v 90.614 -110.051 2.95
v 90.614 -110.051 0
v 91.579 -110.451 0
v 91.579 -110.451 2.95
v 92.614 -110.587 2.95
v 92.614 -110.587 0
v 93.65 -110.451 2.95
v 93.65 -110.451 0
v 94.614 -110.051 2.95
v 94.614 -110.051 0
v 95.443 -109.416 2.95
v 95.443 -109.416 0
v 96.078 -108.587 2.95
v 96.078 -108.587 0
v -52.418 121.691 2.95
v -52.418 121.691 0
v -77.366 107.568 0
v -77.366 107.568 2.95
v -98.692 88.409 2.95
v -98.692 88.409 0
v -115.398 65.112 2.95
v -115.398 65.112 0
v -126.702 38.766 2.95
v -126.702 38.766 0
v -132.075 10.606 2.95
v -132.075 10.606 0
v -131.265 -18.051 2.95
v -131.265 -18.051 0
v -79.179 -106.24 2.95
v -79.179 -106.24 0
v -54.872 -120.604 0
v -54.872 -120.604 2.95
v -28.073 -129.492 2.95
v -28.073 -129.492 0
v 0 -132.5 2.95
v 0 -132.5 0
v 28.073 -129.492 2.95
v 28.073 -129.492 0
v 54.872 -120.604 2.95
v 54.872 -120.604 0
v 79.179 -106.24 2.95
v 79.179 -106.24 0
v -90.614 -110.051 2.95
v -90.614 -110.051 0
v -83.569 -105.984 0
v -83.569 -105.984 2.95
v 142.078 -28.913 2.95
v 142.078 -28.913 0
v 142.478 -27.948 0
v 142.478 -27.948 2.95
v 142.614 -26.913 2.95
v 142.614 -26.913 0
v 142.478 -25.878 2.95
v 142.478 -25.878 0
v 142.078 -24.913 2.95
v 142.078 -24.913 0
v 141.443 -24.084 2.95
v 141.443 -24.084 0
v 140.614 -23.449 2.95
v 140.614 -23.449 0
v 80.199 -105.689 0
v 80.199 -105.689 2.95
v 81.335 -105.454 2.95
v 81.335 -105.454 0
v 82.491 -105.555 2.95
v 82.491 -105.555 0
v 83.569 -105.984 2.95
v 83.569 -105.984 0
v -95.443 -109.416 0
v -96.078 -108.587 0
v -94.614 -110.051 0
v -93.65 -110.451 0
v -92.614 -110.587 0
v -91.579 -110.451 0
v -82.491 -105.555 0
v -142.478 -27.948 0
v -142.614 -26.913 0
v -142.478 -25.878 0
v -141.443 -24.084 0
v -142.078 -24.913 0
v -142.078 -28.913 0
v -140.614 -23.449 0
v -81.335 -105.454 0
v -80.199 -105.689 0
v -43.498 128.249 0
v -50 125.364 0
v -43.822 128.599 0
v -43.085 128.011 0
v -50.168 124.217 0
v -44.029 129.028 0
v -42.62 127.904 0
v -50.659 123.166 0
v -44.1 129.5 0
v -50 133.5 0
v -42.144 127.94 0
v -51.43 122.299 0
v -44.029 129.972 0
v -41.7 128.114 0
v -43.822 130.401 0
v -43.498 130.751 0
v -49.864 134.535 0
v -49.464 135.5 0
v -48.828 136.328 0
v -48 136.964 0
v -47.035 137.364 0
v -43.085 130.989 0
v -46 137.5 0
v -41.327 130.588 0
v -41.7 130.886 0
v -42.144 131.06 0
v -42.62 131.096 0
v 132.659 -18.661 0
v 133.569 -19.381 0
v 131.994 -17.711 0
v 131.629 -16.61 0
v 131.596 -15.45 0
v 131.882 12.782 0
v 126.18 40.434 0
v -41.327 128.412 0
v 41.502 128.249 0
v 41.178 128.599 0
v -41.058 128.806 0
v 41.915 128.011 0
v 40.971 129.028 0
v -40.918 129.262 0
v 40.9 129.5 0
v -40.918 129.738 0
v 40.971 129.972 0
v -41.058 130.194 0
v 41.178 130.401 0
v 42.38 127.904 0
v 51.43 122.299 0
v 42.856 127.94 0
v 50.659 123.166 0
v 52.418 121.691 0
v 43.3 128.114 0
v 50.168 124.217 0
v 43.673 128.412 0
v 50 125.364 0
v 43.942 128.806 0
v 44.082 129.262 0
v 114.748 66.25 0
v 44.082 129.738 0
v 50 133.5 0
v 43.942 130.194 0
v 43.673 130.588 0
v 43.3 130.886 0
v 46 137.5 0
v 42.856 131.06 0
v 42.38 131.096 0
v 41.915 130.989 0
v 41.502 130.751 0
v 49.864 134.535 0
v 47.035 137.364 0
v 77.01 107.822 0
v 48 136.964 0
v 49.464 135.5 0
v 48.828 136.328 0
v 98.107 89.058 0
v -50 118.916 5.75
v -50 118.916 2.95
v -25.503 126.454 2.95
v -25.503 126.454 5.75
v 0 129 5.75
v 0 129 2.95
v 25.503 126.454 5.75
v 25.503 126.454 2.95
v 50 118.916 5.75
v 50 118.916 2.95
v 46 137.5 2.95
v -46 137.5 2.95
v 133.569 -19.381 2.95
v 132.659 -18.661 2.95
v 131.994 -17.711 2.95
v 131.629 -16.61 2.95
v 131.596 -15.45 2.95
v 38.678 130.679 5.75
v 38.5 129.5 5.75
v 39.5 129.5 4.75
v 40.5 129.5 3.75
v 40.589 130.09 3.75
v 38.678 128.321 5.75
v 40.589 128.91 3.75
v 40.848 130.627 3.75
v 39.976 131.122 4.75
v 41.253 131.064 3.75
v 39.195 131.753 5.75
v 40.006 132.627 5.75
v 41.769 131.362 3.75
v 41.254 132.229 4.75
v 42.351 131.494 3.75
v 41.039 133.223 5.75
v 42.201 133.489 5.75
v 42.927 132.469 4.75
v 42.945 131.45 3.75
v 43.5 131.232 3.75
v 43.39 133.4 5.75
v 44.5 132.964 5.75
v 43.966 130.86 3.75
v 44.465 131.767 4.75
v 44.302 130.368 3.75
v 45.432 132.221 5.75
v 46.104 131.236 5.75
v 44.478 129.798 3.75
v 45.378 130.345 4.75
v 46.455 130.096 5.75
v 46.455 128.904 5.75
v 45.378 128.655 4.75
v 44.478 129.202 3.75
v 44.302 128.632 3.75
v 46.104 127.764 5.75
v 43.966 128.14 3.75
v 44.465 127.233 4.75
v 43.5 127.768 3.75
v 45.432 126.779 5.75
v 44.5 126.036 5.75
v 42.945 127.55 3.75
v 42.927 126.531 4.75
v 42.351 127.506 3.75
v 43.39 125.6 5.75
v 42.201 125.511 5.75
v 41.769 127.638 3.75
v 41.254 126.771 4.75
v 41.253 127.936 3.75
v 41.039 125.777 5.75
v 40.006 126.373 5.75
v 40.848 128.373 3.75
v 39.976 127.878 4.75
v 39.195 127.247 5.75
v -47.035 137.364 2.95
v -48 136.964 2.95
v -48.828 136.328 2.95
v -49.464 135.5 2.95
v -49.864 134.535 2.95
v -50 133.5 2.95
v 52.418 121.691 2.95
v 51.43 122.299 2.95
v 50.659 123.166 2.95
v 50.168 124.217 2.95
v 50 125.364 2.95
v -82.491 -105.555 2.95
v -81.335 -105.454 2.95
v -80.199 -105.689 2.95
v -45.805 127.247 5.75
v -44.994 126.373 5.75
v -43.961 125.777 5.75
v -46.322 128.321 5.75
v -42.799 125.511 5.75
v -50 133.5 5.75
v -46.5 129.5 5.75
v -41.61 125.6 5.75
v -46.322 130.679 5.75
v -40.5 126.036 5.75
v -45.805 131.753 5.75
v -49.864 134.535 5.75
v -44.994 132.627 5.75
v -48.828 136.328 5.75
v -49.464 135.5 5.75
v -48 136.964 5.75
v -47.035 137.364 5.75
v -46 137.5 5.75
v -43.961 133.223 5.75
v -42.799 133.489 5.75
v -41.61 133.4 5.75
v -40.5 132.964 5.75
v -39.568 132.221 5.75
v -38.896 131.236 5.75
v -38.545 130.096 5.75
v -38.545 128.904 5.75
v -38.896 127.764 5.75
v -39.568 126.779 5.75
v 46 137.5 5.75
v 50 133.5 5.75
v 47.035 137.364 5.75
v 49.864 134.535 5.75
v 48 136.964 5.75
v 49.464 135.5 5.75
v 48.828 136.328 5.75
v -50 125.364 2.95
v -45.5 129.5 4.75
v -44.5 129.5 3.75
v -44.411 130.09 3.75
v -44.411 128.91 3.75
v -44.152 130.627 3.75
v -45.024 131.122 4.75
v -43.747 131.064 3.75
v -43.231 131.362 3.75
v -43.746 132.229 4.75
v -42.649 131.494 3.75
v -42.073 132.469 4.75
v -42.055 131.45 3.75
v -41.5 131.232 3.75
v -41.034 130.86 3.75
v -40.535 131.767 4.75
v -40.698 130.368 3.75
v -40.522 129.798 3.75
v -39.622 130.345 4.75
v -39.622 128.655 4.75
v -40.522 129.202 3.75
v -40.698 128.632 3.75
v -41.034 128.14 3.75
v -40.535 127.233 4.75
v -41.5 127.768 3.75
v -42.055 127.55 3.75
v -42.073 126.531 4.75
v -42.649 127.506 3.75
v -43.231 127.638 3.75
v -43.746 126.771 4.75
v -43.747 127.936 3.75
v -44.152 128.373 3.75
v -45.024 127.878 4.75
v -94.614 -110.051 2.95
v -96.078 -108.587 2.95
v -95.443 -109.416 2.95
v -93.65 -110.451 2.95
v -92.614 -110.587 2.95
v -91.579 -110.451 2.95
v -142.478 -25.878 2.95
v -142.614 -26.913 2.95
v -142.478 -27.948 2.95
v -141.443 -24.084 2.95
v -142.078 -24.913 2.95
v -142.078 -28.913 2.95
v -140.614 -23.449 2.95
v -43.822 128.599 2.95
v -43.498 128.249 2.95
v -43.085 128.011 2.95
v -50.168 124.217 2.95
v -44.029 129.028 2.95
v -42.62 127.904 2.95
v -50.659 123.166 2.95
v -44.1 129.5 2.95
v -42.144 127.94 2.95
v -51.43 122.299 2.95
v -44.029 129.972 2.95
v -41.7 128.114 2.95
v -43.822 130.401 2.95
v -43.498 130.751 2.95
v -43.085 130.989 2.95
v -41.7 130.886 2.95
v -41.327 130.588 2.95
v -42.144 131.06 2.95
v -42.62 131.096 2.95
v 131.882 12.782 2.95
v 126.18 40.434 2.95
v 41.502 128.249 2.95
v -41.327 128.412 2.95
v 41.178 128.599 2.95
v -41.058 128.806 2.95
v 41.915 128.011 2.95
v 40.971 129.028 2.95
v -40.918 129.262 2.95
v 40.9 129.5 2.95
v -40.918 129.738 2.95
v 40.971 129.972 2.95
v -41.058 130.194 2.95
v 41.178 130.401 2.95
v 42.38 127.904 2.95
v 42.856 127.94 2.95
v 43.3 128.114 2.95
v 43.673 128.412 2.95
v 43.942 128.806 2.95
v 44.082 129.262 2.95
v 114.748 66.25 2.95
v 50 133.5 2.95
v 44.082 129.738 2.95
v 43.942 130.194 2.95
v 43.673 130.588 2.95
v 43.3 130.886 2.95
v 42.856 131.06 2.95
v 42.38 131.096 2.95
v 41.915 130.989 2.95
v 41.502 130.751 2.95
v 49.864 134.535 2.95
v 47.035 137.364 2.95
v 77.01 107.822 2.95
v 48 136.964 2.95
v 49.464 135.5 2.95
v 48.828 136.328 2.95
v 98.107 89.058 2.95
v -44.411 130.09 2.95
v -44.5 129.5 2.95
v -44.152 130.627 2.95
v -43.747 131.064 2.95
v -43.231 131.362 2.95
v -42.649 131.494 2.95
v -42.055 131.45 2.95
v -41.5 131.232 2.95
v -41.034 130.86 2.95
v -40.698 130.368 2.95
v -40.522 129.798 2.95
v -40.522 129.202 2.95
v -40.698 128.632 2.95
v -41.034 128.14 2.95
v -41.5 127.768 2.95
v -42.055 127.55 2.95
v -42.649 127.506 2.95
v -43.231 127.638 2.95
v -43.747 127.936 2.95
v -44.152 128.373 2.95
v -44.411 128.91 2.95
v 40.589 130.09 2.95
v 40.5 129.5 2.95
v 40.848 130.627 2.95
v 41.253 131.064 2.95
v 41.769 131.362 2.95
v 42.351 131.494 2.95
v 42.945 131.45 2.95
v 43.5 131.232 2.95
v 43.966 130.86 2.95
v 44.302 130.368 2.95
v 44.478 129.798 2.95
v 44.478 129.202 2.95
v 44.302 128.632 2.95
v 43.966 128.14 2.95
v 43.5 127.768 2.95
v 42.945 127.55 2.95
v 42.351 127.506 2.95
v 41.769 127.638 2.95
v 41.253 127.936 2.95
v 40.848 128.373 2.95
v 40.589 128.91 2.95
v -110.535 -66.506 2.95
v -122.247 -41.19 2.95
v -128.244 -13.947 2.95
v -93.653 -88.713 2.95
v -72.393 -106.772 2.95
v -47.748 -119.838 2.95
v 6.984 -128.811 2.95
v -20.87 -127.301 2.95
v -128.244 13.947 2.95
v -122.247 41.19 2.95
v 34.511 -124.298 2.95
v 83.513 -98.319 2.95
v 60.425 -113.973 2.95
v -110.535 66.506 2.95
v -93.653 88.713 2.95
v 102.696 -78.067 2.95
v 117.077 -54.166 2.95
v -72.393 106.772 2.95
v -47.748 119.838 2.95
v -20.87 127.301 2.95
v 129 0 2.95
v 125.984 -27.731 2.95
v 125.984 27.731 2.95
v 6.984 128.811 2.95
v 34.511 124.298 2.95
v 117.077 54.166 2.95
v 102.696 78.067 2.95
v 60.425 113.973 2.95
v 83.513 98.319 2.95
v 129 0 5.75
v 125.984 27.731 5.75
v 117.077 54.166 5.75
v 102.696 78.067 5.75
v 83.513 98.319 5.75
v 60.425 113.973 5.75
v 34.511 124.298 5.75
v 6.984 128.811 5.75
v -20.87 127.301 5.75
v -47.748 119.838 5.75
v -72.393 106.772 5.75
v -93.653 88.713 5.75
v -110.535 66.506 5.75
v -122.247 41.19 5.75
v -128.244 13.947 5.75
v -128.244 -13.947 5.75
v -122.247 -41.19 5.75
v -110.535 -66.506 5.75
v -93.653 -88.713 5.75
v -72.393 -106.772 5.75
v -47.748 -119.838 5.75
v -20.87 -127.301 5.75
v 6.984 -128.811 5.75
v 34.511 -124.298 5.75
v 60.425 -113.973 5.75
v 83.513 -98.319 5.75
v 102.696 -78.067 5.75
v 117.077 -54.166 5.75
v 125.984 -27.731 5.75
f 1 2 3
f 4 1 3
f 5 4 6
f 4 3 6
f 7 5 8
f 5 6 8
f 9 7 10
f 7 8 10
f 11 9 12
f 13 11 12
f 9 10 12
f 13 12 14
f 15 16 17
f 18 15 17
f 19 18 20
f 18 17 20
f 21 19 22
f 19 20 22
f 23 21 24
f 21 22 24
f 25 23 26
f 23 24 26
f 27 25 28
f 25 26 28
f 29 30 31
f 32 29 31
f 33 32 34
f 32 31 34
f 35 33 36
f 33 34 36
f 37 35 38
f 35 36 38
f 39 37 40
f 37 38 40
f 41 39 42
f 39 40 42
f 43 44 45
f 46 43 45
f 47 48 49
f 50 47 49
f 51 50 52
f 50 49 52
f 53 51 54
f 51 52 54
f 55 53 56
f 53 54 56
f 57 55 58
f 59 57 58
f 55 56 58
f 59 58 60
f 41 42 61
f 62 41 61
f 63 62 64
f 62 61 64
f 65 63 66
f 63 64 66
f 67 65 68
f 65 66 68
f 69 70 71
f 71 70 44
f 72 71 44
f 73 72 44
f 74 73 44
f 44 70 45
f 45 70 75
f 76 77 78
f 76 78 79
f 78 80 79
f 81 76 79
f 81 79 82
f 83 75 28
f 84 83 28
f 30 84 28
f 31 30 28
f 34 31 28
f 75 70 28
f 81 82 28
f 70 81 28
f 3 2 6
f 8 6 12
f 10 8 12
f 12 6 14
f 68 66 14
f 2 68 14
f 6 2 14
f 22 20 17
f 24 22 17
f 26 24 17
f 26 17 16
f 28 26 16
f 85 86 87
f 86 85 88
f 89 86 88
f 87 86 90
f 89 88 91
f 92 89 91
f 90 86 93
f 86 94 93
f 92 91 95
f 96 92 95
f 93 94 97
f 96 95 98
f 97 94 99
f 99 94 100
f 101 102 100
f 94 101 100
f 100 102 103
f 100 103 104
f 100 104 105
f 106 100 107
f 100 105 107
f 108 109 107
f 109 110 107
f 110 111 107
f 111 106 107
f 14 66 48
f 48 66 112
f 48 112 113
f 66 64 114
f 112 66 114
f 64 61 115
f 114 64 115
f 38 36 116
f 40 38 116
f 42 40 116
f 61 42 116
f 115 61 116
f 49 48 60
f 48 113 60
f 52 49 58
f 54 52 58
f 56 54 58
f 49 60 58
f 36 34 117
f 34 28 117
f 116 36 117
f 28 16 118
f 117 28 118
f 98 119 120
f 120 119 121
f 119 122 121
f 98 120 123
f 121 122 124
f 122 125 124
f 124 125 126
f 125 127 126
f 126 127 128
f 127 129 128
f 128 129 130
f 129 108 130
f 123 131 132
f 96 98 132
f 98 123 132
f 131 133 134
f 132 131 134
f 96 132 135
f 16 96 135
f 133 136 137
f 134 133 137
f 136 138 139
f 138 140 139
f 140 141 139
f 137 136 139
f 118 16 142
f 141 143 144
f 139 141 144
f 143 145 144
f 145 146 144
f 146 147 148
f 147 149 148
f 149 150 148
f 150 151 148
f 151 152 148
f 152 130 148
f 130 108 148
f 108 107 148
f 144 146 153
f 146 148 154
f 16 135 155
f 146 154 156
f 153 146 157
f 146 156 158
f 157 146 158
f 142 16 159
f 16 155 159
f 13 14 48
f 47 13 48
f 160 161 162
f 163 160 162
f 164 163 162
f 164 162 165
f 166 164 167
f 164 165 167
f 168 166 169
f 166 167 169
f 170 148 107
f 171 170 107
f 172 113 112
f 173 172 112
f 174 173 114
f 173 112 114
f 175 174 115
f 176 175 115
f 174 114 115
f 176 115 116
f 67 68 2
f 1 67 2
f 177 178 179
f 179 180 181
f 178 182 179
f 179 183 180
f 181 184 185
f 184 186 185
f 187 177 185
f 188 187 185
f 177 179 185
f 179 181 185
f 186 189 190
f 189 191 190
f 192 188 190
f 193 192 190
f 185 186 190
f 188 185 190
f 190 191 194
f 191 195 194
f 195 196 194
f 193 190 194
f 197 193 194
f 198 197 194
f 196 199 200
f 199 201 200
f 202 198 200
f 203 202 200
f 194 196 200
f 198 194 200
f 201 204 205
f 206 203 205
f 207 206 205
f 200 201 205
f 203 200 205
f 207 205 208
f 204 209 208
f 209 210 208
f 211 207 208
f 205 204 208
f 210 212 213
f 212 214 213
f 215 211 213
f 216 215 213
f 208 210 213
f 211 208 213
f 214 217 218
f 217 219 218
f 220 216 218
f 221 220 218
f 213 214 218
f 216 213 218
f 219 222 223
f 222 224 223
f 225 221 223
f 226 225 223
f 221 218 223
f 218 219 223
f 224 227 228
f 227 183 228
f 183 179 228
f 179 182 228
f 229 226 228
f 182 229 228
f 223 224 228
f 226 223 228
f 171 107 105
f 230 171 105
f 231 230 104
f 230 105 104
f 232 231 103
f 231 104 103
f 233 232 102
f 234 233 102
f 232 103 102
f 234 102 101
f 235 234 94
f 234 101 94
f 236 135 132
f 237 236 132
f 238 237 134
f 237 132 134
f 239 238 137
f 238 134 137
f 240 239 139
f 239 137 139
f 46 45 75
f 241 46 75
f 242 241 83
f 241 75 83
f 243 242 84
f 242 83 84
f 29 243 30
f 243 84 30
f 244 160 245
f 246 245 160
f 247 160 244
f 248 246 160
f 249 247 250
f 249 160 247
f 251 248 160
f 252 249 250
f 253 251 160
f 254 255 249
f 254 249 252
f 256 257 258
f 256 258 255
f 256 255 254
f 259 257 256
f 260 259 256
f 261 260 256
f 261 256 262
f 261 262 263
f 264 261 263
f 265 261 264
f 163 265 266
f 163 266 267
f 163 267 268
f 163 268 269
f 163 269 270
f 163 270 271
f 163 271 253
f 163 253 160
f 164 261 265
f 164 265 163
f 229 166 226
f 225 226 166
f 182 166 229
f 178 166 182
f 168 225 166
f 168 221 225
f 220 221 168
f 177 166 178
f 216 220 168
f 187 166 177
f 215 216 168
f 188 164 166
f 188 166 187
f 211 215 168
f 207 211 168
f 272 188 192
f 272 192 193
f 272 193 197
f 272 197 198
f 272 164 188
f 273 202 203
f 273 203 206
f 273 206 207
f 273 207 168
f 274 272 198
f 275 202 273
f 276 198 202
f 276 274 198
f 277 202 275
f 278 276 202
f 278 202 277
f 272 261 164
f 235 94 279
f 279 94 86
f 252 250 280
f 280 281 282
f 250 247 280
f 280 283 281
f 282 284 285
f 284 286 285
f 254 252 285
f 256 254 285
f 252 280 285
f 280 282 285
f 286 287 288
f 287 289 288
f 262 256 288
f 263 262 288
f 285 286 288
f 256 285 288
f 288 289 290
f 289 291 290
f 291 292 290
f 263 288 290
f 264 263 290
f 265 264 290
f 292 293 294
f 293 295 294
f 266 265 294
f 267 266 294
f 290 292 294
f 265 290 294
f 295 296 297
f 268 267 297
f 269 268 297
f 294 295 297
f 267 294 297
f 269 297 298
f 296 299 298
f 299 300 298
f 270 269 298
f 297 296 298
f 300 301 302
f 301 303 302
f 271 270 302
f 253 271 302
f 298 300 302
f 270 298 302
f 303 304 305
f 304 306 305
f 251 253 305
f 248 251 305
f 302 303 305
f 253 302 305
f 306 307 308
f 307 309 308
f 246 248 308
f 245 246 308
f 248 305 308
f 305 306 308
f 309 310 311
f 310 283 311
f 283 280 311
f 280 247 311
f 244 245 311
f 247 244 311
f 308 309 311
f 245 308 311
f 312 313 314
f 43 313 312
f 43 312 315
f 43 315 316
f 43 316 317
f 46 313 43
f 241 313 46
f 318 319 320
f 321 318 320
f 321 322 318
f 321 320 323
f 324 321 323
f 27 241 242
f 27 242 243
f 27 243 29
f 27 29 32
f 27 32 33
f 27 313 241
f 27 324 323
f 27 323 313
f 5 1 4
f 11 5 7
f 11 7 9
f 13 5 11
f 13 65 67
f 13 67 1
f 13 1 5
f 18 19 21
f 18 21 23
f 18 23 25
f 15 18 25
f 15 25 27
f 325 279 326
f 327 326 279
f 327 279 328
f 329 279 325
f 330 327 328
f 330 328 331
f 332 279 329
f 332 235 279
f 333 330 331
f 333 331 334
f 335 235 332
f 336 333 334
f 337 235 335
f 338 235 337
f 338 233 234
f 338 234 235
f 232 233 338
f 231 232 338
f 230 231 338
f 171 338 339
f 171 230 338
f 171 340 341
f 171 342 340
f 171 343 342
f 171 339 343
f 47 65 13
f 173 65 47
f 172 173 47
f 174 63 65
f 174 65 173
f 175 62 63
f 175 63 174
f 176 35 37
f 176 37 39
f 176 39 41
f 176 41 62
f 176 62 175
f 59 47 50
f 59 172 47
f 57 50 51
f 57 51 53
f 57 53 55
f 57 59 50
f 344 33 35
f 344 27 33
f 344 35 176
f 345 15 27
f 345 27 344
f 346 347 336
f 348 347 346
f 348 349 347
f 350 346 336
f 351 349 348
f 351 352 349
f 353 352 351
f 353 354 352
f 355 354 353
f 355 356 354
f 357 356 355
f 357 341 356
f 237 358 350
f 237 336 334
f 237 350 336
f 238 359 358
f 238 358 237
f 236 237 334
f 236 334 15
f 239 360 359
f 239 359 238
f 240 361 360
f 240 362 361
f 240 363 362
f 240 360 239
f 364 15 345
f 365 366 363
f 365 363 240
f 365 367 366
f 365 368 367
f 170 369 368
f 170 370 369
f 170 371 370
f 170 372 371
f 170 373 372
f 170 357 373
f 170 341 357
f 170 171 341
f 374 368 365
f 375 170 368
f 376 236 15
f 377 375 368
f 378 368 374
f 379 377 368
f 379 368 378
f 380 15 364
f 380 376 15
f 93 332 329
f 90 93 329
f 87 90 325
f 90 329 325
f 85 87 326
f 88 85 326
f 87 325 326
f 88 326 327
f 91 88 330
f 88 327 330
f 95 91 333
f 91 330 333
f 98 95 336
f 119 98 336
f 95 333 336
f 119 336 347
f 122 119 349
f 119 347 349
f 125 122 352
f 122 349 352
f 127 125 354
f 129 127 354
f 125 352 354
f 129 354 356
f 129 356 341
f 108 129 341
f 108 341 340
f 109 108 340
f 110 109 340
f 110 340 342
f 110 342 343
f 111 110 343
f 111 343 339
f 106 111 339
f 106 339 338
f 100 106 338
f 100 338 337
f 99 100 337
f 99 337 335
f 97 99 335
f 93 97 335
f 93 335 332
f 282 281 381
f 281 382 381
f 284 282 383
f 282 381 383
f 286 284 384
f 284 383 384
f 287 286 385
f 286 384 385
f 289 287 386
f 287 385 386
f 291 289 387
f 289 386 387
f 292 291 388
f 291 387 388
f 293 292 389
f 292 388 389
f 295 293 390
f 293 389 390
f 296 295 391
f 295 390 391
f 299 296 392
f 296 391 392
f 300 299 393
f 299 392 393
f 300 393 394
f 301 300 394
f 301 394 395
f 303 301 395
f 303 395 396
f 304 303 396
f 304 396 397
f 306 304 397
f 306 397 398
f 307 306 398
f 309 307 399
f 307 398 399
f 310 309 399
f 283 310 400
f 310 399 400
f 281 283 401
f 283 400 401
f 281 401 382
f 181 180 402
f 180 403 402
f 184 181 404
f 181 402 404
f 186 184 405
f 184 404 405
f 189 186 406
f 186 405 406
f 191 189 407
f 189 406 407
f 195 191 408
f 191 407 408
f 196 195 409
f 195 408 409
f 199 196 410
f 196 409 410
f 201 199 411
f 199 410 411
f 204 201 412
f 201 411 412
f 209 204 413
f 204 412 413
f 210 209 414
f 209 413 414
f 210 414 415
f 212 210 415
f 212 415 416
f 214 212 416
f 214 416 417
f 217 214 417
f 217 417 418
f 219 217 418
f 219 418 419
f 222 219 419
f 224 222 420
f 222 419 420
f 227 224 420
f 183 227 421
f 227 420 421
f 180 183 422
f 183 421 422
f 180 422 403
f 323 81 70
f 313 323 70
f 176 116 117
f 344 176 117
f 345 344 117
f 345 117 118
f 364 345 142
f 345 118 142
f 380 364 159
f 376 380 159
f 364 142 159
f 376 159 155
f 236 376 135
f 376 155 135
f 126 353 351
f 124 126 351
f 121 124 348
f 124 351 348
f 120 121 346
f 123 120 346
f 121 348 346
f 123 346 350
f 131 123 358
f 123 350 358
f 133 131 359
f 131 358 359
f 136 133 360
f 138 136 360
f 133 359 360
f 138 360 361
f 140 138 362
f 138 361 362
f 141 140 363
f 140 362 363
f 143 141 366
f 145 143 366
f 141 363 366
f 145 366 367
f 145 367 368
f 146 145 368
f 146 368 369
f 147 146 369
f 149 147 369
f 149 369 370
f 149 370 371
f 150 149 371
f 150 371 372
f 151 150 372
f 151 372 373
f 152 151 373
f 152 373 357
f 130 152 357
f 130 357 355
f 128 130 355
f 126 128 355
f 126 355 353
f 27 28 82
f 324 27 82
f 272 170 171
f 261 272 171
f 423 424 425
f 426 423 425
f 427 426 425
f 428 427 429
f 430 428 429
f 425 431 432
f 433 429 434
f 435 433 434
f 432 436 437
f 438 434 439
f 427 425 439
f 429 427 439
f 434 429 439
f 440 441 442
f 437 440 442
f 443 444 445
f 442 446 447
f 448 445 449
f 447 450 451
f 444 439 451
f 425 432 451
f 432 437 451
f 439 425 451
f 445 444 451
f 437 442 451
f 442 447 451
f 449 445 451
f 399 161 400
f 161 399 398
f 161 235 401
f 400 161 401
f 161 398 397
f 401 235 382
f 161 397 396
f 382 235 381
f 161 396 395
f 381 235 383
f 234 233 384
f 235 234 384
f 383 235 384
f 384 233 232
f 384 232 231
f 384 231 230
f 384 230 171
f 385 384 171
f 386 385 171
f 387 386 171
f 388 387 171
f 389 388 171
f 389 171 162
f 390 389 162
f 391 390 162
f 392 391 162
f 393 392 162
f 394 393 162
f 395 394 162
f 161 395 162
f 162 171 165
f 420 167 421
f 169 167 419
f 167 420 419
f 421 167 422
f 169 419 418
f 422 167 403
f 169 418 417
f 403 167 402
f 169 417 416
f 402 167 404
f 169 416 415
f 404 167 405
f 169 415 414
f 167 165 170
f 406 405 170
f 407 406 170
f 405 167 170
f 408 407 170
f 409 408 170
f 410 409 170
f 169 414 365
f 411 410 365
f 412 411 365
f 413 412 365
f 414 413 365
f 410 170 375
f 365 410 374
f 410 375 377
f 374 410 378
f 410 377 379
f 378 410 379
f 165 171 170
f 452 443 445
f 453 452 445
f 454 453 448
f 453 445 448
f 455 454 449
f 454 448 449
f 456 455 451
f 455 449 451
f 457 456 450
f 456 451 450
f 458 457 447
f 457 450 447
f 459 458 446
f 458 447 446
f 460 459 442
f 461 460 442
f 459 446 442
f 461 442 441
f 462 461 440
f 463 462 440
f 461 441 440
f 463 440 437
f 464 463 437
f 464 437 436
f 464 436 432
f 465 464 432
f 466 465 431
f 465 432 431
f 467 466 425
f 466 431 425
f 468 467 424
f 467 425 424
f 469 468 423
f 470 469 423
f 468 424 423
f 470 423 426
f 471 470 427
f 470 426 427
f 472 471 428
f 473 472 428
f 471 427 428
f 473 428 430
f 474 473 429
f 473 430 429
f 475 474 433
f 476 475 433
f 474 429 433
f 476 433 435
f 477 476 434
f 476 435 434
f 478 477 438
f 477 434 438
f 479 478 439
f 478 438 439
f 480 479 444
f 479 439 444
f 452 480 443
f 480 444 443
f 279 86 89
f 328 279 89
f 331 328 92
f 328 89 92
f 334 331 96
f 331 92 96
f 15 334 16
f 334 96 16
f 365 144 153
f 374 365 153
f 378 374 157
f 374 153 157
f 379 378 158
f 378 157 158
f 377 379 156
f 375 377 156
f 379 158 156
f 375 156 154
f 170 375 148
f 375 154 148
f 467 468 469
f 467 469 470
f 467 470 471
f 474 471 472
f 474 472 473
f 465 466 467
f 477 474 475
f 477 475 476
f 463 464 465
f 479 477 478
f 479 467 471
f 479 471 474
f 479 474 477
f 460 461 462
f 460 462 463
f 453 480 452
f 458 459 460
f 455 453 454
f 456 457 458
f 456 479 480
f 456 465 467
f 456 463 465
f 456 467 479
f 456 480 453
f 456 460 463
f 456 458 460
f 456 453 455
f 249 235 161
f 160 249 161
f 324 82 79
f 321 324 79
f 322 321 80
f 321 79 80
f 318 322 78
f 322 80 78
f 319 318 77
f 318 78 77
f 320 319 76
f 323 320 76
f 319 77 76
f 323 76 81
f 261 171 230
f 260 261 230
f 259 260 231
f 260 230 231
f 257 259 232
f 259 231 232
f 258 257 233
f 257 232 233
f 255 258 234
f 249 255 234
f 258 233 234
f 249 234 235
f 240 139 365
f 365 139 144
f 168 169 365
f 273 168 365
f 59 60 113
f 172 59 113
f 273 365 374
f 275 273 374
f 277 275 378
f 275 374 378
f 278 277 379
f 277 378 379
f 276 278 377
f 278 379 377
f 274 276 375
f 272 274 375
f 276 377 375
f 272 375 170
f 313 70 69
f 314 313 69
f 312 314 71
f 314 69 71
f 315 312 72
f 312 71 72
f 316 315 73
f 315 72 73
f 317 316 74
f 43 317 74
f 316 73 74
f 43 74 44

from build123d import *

# Parameters (mm, degrees)
F2_DEPTH       = 2.95
F3_D           = 3.2
F4_R           = 129
F5_DEPTH       = 2.8
F6_R           = 1.6
F7_DEPTH       = 2.8
F9_D           = 4
F9_CSINK_D     = 8
F9_CSINK_ANGLE = 90


# Not quite as in the source:
# - a feature names something its author has since deleted; it is built from what else it names


with BuildPart() as f2:
    # F1 (on Top) → F2 (new body)
    with BuildSketch(Plane.XY):
        with BuildLine():
            ThreePointArc((-83.5688145832, -105.9835045144), (-81.3352017208, -105.4544338279), (-79.1785196504, -106.2403502723))
            ThreePointArc((-79.1785196504, -106.2403502723), (0, -132.5), (79.1785196504, -106.2403502723))
            ThreePointArc((79.1785196504, -106.2403502723), (81.3352017208, -105.4544338279), (83.5688145832, -105.9835045144))
            Line((83.5688145832, -105.9835045144), (90.6143914052, -110.0512701892))
            ThreePointArc((90.6143914052, -110.0512701892), (93.6496675856, -110.4508718792), (96.0784930204, -108.5871685741))
            Line((96.0784930204, -108.5871685741), (142.0784930204, -28.9128314259))
            ThreePointArc((142.0784930204, -28.9128314259), (142.4780947104, -25.8775552455), (140.6143914052, -23.4487298108))
            Line((140.6143914052, -23.4487298108), (133.5688145832, -19.380964136))
            ThreePointArc((133.5688145832, -19.380964136), (131.9938194971, -17.7111339982), (131.5961020679, -15.4504343151))
            ThreePointArc((131.5961020679, -15.4504343151), (114.7483660014, 66.25), (52.4175824176, 121.6907845874))
            ThreePointArc((52.4175824176, 121.6907845874), (50.6586177763, 123.1655678261), (50, 125.3644686504))
            Line((50, 125.3644686504), (50, 133.5))
            ThreePointArc((50, 133.5), (48.8284271247, 136.3284271247), (46, 137.5))
            Line((46, 137.5), (-46, 137.5))
            ThreePointArc((-46, 137.5), (-48.8284271247, 136.3284271247), (-50, 133.5))
            Line((-50, 133.5), (-50, 125.3644686504))
            ThreePointArc((-50, 125.3644686504), (-50.6586177763, 123.1655678261), (-52.4175824176, 121.6907845874))
            ThreePointArc((-52.4175824176, 121.6907845874), (-115.3980732063, 65.1117093946), (-131.2647048648, -18.0506857698))
            Line((-131.2647048648, -18.0506857698), (-140.6143914052, -23.4487298108))
            ThreePointArc((-140.6143914052, -23.4487298108), (-142.4780947104, -25.8775552455), (-142.0784930204, -28.9128314259))
            Line((-142.0784930204, -28.9128314259), (-96.0784930204, -108.5871685741))
            ThreePointArc((-96.0784930204, -108.5871685741), (-93.6496675856, -110.4508718792), (-90.6143914052, -110.0512701892))
            Line((-90.6143914052, -110.0512701892), (-83.5688145832, -105.9835045144))
        make_face()
    extrude(amount=F2_DEPTH)

    # F3 (through all)
    with Locations(Plane(origin=(0, 0, 0), x_dir=(1, 0, 0), z_dir=(0, 0, -1))):
        with Locations((-42.5, -129.5), (42.5, -129.5)):
            Hole(F3_D / 2)


with BuildPart() as f5:
    # F4 (on face) → F5 (new body)
    with BuildSketch(Plane.XY.offset(2.95)):
        Circle(F4_R)
    extrude(amount=F5_DEPTH)


with BuildPart() as f7:
    # F6 (on face) → F7 (new body)
    with BuildSketch(Plane.XY.offset(2.95)):
        with BuildLine():
            ThreePointArc((-46, 137.5), (-48.8284271247, 136.3284271247), (-50, 133.5))
            Line((-50, 133.5), (-50, 125.3644686504))
            Line((-50, 125.3644686504), (-50, 118.9159366948))
            ThreePointArc((-50, 118.9159366948), (0, 129), (50, 118.9159366948))
            Line((50, 118.9159366948), (50, 125.3644686504))
            Line((50, 125.3644686504), (50, 133.5))
            ThreePointArc((50, 133.5), (48.8284271247, 136.3284271247), (46, 137.5))
            Line((46, 137.5), (-46, 137.5))
        make_face()
        with Locations((-42.5, 129.5)):
            Circle(F6_R, mode=Mode.SUBTRACT)
        with Locations((42.5, 129.5)):
            Circle(F6_R, mode=Mode.SUBTRACT)
    extrude(amount=F7_DEPTH)

    # F9 (through all)
    with Locations(Plane.XY.offset(5.75)):
        with Locations((42.5, 129.5), (-42.5, 129.5)):
            CounterSinkHole(F9_D / 2, F9_CSINK_D / 2, counter_sink_angle=F9_CSINK_ANGLE)


solid = Compound([f2.part, f5.part, f7.part])
